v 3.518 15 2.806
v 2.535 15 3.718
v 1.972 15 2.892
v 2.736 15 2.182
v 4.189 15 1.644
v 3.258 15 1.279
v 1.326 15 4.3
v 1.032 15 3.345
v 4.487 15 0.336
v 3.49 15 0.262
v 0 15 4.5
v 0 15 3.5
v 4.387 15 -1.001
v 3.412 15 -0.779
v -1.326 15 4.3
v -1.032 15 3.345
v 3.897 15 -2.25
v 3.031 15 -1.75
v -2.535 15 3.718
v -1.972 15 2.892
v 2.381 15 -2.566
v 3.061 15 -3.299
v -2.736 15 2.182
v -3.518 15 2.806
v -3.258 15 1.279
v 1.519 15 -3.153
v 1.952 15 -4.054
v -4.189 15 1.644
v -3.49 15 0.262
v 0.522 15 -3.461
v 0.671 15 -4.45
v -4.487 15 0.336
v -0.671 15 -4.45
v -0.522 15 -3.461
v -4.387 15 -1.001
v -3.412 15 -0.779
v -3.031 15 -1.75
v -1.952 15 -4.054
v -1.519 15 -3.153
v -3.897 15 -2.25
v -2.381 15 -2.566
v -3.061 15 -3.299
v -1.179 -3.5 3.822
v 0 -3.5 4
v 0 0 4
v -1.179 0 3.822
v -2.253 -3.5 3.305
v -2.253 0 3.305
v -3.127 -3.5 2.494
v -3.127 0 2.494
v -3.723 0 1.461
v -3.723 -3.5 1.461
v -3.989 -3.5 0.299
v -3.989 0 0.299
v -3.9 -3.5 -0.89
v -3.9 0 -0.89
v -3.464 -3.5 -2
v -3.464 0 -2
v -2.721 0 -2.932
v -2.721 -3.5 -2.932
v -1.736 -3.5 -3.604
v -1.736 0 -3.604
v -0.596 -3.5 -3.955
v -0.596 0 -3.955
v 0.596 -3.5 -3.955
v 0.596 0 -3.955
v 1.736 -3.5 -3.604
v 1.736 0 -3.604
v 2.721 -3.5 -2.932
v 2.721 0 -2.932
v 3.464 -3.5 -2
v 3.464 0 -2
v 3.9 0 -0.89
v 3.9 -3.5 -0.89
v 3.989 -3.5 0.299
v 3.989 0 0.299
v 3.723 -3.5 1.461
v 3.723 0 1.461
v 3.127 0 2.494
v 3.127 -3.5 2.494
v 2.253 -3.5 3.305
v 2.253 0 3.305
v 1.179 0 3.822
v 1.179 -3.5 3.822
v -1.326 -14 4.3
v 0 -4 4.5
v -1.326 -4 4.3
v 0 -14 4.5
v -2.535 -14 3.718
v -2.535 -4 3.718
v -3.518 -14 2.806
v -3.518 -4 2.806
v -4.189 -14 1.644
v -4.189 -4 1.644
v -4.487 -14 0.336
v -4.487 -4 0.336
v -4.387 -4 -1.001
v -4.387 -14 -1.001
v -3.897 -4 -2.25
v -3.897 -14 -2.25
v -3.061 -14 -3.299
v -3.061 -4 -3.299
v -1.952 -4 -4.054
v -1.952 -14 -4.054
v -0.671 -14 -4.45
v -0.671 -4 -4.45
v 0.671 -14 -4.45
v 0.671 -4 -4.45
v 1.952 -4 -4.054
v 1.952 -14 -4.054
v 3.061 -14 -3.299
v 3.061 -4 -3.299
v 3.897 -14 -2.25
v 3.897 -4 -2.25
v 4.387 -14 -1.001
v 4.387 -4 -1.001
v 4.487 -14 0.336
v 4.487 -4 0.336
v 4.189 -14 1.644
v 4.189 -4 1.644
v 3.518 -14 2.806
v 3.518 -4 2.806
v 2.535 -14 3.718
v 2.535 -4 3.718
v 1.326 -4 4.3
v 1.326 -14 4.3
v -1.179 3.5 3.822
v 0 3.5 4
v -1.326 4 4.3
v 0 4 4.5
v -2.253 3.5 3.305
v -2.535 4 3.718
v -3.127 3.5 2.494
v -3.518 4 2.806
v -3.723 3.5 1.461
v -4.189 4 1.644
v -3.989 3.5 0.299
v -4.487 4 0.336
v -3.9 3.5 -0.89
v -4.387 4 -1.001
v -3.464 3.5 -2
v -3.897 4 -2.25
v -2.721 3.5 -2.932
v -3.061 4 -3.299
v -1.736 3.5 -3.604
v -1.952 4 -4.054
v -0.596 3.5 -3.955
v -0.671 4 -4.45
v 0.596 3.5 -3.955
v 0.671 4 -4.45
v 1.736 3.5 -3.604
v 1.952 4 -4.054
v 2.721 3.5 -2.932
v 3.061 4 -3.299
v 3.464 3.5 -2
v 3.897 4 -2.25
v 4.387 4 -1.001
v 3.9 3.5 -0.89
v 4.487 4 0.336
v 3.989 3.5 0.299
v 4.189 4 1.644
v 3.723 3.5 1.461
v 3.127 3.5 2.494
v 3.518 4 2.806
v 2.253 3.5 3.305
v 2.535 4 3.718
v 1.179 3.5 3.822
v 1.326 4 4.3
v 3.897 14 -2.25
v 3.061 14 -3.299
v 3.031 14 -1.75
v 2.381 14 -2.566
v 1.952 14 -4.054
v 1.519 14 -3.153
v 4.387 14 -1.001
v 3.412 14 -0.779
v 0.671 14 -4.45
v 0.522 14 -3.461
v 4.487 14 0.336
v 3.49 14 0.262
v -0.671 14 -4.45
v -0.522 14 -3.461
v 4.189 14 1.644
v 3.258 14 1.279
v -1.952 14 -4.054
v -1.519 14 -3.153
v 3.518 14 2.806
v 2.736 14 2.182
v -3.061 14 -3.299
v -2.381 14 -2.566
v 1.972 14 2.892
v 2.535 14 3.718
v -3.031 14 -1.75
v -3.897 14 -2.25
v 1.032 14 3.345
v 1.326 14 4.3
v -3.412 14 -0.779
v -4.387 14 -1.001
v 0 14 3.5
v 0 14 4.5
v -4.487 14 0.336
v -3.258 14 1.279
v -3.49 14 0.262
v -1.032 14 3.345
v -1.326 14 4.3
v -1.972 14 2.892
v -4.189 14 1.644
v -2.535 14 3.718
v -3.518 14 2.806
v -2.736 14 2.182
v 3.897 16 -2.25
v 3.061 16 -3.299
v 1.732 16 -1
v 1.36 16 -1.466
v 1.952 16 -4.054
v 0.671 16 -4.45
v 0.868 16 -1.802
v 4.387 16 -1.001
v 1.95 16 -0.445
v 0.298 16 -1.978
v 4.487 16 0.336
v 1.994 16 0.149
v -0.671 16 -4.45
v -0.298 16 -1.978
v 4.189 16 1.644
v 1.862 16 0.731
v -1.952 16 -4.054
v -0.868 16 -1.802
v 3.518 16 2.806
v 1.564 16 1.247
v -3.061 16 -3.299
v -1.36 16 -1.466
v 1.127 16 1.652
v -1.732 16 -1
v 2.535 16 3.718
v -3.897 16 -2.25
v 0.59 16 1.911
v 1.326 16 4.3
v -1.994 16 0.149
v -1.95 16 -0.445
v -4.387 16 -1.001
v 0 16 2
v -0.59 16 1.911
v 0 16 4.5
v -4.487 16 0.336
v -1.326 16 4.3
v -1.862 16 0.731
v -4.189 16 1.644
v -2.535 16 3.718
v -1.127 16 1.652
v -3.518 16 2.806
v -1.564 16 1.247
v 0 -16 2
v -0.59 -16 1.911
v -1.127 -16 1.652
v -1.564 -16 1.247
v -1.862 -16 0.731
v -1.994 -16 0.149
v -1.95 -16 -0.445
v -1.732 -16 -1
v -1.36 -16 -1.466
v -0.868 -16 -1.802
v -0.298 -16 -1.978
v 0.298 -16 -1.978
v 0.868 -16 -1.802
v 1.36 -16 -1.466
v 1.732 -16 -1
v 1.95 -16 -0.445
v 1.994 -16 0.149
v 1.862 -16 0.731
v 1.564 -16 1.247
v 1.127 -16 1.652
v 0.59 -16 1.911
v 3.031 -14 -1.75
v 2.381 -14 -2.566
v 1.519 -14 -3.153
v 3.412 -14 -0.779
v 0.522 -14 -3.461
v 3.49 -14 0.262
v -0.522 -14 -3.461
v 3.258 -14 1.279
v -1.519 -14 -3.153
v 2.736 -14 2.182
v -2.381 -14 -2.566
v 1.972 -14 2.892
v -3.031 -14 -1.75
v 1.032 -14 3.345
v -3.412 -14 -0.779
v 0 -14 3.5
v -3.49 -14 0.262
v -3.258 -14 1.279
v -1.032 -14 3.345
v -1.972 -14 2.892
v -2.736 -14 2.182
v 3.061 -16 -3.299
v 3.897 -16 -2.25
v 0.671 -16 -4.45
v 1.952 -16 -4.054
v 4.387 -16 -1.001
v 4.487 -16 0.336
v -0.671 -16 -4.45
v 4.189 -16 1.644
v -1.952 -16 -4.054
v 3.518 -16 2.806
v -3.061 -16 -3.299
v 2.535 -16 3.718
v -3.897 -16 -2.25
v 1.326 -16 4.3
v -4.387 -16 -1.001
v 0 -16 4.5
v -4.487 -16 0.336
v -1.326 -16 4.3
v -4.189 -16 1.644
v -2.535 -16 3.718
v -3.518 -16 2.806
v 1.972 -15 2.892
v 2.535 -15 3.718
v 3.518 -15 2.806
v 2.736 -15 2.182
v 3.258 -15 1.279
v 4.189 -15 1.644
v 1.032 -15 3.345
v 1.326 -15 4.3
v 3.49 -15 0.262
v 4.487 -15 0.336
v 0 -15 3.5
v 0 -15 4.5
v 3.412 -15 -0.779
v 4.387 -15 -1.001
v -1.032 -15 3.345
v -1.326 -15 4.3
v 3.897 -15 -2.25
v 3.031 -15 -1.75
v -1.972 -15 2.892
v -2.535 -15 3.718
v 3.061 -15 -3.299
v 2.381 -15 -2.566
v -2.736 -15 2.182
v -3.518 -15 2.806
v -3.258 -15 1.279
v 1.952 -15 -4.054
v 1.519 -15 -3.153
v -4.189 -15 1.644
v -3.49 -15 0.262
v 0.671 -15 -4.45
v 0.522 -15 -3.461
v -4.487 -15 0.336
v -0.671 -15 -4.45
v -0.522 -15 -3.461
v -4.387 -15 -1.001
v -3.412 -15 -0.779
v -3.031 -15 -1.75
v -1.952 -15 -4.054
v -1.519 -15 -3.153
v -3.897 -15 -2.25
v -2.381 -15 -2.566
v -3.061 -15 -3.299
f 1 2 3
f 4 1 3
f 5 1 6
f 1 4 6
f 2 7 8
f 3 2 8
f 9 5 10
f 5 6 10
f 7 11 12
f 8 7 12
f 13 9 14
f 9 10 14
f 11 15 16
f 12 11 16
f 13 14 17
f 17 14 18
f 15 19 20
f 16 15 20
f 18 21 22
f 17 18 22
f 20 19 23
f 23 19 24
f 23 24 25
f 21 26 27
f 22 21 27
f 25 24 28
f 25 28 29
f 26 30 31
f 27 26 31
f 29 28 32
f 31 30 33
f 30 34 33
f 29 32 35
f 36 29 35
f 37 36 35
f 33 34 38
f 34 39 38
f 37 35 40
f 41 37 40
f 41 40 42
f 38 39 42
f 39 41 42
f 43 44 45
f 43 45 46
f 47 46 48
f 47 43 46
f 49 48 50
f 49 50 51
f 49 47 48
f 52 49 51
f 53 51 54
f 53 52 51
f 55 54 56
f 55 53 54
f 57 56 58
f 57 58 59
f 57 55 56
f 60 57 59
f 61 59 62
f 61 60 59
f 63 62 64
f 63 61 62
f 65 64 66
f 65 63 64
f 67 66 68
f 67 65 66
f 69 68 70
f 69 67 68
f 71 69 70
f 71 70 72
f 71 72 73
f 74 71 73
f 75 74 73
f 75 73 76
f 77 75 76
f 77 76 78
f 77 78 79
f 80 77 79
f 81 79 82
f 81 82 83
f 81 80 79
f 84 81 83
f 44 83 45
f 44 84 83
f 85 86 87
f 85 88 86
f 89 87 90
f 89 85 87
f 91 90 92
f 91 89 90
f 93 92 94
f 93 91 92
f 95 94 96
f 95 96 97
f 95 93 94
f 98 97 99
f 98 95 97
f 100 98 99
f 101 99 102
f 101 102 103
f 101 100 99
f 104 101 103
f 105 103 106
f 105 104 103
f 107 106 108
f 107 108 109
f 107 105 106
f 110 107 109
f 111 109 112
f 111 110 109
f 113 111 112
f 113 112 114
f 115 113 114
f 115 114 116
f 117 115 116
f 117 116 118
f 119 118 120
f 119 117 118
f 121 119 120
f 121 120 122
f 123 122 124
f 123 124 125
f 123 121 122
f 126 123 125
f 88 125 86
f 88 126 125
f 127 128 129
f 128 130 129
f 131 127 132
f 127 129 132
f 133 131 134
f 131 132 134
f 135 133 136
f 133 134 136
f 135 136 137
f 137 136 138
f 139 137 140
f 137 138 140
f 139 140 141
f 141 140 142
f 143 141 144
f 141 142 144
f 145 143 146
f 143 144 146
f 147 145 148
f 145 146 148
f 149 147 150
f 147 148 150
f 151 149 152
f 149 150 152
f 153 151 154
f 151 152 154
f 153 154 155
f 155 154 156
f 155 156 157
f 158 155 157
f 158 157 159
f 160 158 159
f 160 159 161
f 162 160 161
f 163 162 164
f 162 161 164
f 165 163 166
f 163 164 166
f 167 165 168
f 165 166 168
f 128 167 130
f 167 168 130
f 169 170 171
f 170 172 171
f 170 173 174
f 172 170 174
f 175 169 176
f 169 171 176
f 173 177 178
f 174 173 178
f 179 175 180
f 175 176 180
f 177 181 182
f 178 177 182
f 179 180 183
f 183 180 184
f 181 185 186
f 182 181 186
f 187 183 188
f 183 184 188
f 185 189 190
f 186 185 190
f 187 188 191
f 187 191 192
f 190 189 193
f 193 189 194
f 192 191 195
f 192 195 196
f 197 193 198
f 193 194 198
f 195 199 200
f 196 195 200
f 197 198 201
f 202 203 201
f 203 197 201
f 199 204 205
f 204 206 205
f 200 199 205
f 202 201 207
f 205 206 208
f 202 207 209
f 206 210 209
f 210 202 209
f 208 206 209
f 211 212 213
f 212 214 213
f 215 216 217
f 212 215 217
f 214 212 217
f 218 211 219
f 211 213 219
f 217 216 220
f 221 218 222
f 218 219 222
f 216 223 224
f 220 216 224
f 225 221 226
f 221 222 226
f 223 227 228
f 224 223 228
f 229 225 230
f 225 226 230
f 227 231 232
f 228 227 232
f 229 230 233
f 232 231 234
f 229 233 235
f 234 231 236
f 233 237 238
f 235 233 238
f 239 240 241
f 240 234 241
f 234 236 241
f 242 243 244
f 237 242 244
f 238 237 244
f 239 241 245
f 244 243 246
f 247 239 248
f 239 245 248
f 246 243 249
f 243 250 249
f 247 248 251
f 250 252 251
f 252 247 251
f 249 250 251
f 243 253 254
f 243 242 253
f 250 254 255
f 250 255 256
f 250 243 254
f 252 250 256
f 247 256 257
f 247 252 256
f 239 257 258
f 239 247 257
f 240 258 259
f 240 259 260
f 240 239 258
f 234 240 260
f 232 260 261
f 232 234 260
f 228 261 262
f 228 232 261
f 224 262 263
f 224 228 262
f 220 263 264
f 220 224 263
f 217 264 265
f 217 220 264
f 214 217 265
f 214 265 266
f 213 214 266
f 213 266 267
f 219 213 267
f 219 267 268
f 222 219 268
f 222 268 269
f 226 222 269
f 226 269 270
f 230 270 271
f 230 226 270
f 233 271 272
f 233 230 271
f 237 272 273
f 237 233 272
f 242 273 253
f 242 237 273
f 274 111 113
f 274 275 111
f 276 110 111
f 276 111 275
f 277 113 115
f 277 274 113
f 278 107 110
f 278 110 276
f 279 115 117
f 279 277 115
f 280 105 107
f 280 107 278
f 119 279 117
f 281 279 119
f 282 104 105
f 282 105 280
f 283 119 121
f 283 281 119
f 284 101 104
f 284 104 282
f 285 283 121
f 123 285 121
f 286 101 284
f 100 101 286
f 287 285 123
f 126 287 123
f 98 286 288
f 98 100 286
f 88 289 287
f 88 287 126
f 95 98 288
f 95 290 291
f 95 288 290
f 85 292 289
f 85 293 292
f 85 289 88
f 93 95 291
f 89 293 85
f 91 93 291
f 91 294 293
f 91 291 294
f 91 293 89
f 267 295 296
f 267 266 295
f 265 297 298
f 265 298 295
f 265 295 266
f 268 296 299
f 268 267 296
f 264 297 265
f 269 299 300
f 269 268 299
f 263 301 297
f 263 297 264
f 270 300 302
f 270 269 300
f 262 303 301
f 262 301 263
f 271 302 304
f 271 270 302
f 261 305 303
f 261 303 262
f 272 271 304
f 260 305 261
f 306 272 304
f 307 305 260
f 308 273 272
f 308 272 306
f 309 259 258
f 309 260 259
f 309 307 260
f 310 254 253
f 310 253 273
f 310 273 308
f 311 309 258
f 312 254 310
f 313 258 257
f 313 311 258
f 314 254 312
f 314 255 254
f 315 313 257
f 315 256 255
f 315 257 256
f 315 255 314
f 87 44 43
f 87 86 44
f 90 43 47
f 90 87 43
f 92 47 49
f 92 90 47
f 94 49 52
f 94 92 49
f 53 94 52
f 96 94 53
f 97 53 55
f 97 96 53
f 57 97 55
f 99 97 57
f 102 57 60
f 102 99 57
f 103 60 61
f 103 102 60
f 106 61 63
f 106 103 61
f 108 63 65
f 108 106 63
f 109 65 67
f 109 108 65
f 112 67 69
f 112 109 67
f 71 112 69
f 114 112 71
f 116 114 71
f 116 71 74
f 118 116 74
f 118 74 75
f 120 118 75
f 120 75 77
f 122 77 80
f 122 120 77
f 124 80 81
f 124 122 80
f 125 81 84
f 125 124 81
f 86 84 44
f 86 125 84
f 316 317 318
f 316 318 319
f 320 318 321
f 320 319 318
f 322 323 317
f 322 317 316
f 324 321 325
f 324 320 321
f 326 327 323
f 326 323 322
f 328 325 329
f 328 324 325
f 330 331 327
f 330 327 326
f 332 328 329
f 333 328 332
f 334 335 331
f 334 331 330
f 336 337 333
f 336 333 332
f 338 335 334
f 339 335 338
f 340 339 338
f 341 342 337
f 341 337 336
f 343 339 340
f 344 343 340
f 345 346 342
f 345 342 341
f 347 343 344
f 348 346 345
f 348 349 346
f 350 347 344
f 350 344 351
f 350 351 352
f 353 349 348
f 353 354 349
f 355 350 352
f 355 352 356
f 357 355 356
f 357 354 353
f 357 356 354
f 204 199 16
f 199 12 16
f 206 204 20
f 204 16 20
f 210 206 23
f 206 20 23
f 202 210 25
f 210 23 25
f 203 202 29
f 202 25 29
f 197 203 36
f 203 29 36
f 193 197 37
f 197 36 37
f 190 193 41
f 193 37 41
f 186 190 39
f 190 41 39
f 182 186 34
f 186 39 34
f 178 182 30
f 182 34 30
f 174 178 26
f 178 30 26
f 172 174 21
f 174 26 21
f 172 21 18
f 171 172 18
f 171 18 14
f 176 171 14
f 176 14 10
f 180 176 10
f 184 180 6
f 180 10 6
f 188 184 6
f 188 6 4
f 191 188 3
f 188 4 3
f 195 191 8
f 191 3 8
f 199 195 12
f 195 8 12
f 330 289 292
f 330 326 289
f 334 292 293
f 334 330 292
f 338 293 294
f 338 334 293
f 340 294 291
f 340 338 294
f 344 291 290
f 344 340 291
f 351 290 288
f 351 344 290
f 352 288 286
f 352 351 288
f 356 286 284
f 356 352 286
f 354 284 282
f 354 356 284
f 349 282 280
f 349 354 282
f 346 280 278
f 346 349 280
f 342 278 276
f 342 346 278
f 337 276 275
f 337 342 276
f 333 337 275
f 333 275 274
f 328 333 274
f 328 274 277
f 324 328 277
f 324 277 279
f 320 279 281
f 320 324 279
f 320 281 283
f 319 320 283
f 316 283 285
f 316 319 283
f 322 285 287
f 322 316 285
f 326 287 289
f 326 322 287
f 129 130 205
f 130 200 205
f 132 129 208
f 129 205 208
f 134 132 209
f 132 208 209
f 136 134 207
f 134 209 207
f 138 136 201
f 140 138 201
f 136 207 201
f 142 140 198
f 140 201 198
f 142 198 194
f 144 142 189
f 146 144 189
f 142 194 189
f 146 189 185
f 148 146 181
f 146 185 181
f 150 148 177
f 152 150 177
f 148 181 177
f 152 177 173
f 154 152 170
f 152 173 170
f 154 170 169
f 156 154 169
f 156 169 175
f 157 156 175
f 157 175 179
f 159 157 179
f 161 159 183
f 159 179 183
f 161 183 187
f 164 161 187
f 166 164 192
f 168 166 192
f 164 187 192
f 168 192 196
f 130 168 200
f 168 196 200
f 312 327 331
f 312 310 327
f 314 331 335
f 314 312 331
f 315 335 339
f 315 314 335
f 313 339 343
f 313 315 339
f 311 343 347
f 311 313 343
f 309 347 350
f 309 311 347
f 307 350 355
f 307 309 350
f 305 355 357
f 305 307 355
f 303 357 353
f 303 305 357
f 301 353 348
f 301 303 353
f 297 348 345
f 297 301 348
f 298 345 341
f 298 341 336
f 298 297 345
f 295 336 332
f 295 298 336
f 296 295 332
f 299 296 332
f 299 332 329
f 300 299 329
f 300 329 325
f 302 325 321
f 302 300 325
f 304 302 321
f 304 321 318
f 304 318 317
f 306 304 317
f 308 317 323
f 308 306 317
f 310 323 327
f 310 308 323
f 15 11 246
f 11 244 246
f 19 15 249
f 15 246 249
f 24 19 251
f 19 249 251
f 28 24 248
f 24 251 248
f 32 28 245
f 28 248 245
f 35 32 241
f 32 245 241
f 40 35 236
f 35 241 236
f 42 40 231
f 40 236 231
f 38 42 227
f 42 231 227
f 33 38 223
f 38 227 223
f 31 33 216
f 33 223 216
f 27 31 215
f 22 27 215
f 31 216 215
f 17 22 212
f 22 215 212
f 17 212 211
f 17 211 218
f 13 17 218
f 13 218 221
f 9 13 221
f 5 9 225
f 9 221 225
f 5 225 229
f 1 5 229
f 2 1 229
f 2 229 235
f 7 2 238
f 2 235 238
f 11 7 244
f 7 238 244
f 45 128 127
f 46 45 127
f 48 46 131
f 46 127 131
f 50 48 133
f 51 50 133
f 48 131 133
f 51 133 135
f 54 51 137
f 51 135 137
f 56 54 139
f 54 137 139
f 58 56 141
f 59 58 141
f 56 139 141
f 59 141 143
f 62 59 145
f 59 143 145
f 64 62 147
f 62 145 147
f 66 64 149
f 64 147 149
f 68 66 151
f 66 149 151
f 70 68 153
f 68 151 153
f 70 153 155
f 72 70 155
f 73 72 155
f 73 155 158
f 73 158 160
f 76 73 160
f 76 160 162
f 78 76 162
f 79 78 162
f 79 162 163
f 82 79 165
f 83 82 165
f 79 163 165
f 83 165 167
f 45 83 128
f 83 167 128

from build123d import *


with BuildPart() as part:
    # Эскиз1 → Повернуть1 (revolve)
    with BuildSketch(Plane.XY, mode=Mode.PRIVATE) as revolve_1_sk:
        Polygon((4.5, 16), (2, 16), (2, 0), (4, 0), (4, 3.5), (4.5, 4), (4.5, 14), (3.5, 14), (3.5, 15), (4.5, 15), align=None)
    revolve_1 = revolve(revolve_1_sk.sketch.rotate(Axis((0, 64.627595022, 0), (0, -1, 0)), 90), axis=Axis((0, 64.627595022, 0), (0, -1, 0)))


with BuildPart() as mirror_1_1:
    # Зеркальное отражение1: Повернуть1 across Top Plane
    add(revolve_1.mirror(Plane(origin=(0, 0, 0), x_dir=(1, 0, 0), z_dir=(0, 1, 0))))


with BuildPart() as part_1:
    add(part.part)

    # Зеркальное отражение1 united with what the copies tou: union Зеркальное отражение1_1
    add(mirror_1_1.part)


solid = part_1.part
